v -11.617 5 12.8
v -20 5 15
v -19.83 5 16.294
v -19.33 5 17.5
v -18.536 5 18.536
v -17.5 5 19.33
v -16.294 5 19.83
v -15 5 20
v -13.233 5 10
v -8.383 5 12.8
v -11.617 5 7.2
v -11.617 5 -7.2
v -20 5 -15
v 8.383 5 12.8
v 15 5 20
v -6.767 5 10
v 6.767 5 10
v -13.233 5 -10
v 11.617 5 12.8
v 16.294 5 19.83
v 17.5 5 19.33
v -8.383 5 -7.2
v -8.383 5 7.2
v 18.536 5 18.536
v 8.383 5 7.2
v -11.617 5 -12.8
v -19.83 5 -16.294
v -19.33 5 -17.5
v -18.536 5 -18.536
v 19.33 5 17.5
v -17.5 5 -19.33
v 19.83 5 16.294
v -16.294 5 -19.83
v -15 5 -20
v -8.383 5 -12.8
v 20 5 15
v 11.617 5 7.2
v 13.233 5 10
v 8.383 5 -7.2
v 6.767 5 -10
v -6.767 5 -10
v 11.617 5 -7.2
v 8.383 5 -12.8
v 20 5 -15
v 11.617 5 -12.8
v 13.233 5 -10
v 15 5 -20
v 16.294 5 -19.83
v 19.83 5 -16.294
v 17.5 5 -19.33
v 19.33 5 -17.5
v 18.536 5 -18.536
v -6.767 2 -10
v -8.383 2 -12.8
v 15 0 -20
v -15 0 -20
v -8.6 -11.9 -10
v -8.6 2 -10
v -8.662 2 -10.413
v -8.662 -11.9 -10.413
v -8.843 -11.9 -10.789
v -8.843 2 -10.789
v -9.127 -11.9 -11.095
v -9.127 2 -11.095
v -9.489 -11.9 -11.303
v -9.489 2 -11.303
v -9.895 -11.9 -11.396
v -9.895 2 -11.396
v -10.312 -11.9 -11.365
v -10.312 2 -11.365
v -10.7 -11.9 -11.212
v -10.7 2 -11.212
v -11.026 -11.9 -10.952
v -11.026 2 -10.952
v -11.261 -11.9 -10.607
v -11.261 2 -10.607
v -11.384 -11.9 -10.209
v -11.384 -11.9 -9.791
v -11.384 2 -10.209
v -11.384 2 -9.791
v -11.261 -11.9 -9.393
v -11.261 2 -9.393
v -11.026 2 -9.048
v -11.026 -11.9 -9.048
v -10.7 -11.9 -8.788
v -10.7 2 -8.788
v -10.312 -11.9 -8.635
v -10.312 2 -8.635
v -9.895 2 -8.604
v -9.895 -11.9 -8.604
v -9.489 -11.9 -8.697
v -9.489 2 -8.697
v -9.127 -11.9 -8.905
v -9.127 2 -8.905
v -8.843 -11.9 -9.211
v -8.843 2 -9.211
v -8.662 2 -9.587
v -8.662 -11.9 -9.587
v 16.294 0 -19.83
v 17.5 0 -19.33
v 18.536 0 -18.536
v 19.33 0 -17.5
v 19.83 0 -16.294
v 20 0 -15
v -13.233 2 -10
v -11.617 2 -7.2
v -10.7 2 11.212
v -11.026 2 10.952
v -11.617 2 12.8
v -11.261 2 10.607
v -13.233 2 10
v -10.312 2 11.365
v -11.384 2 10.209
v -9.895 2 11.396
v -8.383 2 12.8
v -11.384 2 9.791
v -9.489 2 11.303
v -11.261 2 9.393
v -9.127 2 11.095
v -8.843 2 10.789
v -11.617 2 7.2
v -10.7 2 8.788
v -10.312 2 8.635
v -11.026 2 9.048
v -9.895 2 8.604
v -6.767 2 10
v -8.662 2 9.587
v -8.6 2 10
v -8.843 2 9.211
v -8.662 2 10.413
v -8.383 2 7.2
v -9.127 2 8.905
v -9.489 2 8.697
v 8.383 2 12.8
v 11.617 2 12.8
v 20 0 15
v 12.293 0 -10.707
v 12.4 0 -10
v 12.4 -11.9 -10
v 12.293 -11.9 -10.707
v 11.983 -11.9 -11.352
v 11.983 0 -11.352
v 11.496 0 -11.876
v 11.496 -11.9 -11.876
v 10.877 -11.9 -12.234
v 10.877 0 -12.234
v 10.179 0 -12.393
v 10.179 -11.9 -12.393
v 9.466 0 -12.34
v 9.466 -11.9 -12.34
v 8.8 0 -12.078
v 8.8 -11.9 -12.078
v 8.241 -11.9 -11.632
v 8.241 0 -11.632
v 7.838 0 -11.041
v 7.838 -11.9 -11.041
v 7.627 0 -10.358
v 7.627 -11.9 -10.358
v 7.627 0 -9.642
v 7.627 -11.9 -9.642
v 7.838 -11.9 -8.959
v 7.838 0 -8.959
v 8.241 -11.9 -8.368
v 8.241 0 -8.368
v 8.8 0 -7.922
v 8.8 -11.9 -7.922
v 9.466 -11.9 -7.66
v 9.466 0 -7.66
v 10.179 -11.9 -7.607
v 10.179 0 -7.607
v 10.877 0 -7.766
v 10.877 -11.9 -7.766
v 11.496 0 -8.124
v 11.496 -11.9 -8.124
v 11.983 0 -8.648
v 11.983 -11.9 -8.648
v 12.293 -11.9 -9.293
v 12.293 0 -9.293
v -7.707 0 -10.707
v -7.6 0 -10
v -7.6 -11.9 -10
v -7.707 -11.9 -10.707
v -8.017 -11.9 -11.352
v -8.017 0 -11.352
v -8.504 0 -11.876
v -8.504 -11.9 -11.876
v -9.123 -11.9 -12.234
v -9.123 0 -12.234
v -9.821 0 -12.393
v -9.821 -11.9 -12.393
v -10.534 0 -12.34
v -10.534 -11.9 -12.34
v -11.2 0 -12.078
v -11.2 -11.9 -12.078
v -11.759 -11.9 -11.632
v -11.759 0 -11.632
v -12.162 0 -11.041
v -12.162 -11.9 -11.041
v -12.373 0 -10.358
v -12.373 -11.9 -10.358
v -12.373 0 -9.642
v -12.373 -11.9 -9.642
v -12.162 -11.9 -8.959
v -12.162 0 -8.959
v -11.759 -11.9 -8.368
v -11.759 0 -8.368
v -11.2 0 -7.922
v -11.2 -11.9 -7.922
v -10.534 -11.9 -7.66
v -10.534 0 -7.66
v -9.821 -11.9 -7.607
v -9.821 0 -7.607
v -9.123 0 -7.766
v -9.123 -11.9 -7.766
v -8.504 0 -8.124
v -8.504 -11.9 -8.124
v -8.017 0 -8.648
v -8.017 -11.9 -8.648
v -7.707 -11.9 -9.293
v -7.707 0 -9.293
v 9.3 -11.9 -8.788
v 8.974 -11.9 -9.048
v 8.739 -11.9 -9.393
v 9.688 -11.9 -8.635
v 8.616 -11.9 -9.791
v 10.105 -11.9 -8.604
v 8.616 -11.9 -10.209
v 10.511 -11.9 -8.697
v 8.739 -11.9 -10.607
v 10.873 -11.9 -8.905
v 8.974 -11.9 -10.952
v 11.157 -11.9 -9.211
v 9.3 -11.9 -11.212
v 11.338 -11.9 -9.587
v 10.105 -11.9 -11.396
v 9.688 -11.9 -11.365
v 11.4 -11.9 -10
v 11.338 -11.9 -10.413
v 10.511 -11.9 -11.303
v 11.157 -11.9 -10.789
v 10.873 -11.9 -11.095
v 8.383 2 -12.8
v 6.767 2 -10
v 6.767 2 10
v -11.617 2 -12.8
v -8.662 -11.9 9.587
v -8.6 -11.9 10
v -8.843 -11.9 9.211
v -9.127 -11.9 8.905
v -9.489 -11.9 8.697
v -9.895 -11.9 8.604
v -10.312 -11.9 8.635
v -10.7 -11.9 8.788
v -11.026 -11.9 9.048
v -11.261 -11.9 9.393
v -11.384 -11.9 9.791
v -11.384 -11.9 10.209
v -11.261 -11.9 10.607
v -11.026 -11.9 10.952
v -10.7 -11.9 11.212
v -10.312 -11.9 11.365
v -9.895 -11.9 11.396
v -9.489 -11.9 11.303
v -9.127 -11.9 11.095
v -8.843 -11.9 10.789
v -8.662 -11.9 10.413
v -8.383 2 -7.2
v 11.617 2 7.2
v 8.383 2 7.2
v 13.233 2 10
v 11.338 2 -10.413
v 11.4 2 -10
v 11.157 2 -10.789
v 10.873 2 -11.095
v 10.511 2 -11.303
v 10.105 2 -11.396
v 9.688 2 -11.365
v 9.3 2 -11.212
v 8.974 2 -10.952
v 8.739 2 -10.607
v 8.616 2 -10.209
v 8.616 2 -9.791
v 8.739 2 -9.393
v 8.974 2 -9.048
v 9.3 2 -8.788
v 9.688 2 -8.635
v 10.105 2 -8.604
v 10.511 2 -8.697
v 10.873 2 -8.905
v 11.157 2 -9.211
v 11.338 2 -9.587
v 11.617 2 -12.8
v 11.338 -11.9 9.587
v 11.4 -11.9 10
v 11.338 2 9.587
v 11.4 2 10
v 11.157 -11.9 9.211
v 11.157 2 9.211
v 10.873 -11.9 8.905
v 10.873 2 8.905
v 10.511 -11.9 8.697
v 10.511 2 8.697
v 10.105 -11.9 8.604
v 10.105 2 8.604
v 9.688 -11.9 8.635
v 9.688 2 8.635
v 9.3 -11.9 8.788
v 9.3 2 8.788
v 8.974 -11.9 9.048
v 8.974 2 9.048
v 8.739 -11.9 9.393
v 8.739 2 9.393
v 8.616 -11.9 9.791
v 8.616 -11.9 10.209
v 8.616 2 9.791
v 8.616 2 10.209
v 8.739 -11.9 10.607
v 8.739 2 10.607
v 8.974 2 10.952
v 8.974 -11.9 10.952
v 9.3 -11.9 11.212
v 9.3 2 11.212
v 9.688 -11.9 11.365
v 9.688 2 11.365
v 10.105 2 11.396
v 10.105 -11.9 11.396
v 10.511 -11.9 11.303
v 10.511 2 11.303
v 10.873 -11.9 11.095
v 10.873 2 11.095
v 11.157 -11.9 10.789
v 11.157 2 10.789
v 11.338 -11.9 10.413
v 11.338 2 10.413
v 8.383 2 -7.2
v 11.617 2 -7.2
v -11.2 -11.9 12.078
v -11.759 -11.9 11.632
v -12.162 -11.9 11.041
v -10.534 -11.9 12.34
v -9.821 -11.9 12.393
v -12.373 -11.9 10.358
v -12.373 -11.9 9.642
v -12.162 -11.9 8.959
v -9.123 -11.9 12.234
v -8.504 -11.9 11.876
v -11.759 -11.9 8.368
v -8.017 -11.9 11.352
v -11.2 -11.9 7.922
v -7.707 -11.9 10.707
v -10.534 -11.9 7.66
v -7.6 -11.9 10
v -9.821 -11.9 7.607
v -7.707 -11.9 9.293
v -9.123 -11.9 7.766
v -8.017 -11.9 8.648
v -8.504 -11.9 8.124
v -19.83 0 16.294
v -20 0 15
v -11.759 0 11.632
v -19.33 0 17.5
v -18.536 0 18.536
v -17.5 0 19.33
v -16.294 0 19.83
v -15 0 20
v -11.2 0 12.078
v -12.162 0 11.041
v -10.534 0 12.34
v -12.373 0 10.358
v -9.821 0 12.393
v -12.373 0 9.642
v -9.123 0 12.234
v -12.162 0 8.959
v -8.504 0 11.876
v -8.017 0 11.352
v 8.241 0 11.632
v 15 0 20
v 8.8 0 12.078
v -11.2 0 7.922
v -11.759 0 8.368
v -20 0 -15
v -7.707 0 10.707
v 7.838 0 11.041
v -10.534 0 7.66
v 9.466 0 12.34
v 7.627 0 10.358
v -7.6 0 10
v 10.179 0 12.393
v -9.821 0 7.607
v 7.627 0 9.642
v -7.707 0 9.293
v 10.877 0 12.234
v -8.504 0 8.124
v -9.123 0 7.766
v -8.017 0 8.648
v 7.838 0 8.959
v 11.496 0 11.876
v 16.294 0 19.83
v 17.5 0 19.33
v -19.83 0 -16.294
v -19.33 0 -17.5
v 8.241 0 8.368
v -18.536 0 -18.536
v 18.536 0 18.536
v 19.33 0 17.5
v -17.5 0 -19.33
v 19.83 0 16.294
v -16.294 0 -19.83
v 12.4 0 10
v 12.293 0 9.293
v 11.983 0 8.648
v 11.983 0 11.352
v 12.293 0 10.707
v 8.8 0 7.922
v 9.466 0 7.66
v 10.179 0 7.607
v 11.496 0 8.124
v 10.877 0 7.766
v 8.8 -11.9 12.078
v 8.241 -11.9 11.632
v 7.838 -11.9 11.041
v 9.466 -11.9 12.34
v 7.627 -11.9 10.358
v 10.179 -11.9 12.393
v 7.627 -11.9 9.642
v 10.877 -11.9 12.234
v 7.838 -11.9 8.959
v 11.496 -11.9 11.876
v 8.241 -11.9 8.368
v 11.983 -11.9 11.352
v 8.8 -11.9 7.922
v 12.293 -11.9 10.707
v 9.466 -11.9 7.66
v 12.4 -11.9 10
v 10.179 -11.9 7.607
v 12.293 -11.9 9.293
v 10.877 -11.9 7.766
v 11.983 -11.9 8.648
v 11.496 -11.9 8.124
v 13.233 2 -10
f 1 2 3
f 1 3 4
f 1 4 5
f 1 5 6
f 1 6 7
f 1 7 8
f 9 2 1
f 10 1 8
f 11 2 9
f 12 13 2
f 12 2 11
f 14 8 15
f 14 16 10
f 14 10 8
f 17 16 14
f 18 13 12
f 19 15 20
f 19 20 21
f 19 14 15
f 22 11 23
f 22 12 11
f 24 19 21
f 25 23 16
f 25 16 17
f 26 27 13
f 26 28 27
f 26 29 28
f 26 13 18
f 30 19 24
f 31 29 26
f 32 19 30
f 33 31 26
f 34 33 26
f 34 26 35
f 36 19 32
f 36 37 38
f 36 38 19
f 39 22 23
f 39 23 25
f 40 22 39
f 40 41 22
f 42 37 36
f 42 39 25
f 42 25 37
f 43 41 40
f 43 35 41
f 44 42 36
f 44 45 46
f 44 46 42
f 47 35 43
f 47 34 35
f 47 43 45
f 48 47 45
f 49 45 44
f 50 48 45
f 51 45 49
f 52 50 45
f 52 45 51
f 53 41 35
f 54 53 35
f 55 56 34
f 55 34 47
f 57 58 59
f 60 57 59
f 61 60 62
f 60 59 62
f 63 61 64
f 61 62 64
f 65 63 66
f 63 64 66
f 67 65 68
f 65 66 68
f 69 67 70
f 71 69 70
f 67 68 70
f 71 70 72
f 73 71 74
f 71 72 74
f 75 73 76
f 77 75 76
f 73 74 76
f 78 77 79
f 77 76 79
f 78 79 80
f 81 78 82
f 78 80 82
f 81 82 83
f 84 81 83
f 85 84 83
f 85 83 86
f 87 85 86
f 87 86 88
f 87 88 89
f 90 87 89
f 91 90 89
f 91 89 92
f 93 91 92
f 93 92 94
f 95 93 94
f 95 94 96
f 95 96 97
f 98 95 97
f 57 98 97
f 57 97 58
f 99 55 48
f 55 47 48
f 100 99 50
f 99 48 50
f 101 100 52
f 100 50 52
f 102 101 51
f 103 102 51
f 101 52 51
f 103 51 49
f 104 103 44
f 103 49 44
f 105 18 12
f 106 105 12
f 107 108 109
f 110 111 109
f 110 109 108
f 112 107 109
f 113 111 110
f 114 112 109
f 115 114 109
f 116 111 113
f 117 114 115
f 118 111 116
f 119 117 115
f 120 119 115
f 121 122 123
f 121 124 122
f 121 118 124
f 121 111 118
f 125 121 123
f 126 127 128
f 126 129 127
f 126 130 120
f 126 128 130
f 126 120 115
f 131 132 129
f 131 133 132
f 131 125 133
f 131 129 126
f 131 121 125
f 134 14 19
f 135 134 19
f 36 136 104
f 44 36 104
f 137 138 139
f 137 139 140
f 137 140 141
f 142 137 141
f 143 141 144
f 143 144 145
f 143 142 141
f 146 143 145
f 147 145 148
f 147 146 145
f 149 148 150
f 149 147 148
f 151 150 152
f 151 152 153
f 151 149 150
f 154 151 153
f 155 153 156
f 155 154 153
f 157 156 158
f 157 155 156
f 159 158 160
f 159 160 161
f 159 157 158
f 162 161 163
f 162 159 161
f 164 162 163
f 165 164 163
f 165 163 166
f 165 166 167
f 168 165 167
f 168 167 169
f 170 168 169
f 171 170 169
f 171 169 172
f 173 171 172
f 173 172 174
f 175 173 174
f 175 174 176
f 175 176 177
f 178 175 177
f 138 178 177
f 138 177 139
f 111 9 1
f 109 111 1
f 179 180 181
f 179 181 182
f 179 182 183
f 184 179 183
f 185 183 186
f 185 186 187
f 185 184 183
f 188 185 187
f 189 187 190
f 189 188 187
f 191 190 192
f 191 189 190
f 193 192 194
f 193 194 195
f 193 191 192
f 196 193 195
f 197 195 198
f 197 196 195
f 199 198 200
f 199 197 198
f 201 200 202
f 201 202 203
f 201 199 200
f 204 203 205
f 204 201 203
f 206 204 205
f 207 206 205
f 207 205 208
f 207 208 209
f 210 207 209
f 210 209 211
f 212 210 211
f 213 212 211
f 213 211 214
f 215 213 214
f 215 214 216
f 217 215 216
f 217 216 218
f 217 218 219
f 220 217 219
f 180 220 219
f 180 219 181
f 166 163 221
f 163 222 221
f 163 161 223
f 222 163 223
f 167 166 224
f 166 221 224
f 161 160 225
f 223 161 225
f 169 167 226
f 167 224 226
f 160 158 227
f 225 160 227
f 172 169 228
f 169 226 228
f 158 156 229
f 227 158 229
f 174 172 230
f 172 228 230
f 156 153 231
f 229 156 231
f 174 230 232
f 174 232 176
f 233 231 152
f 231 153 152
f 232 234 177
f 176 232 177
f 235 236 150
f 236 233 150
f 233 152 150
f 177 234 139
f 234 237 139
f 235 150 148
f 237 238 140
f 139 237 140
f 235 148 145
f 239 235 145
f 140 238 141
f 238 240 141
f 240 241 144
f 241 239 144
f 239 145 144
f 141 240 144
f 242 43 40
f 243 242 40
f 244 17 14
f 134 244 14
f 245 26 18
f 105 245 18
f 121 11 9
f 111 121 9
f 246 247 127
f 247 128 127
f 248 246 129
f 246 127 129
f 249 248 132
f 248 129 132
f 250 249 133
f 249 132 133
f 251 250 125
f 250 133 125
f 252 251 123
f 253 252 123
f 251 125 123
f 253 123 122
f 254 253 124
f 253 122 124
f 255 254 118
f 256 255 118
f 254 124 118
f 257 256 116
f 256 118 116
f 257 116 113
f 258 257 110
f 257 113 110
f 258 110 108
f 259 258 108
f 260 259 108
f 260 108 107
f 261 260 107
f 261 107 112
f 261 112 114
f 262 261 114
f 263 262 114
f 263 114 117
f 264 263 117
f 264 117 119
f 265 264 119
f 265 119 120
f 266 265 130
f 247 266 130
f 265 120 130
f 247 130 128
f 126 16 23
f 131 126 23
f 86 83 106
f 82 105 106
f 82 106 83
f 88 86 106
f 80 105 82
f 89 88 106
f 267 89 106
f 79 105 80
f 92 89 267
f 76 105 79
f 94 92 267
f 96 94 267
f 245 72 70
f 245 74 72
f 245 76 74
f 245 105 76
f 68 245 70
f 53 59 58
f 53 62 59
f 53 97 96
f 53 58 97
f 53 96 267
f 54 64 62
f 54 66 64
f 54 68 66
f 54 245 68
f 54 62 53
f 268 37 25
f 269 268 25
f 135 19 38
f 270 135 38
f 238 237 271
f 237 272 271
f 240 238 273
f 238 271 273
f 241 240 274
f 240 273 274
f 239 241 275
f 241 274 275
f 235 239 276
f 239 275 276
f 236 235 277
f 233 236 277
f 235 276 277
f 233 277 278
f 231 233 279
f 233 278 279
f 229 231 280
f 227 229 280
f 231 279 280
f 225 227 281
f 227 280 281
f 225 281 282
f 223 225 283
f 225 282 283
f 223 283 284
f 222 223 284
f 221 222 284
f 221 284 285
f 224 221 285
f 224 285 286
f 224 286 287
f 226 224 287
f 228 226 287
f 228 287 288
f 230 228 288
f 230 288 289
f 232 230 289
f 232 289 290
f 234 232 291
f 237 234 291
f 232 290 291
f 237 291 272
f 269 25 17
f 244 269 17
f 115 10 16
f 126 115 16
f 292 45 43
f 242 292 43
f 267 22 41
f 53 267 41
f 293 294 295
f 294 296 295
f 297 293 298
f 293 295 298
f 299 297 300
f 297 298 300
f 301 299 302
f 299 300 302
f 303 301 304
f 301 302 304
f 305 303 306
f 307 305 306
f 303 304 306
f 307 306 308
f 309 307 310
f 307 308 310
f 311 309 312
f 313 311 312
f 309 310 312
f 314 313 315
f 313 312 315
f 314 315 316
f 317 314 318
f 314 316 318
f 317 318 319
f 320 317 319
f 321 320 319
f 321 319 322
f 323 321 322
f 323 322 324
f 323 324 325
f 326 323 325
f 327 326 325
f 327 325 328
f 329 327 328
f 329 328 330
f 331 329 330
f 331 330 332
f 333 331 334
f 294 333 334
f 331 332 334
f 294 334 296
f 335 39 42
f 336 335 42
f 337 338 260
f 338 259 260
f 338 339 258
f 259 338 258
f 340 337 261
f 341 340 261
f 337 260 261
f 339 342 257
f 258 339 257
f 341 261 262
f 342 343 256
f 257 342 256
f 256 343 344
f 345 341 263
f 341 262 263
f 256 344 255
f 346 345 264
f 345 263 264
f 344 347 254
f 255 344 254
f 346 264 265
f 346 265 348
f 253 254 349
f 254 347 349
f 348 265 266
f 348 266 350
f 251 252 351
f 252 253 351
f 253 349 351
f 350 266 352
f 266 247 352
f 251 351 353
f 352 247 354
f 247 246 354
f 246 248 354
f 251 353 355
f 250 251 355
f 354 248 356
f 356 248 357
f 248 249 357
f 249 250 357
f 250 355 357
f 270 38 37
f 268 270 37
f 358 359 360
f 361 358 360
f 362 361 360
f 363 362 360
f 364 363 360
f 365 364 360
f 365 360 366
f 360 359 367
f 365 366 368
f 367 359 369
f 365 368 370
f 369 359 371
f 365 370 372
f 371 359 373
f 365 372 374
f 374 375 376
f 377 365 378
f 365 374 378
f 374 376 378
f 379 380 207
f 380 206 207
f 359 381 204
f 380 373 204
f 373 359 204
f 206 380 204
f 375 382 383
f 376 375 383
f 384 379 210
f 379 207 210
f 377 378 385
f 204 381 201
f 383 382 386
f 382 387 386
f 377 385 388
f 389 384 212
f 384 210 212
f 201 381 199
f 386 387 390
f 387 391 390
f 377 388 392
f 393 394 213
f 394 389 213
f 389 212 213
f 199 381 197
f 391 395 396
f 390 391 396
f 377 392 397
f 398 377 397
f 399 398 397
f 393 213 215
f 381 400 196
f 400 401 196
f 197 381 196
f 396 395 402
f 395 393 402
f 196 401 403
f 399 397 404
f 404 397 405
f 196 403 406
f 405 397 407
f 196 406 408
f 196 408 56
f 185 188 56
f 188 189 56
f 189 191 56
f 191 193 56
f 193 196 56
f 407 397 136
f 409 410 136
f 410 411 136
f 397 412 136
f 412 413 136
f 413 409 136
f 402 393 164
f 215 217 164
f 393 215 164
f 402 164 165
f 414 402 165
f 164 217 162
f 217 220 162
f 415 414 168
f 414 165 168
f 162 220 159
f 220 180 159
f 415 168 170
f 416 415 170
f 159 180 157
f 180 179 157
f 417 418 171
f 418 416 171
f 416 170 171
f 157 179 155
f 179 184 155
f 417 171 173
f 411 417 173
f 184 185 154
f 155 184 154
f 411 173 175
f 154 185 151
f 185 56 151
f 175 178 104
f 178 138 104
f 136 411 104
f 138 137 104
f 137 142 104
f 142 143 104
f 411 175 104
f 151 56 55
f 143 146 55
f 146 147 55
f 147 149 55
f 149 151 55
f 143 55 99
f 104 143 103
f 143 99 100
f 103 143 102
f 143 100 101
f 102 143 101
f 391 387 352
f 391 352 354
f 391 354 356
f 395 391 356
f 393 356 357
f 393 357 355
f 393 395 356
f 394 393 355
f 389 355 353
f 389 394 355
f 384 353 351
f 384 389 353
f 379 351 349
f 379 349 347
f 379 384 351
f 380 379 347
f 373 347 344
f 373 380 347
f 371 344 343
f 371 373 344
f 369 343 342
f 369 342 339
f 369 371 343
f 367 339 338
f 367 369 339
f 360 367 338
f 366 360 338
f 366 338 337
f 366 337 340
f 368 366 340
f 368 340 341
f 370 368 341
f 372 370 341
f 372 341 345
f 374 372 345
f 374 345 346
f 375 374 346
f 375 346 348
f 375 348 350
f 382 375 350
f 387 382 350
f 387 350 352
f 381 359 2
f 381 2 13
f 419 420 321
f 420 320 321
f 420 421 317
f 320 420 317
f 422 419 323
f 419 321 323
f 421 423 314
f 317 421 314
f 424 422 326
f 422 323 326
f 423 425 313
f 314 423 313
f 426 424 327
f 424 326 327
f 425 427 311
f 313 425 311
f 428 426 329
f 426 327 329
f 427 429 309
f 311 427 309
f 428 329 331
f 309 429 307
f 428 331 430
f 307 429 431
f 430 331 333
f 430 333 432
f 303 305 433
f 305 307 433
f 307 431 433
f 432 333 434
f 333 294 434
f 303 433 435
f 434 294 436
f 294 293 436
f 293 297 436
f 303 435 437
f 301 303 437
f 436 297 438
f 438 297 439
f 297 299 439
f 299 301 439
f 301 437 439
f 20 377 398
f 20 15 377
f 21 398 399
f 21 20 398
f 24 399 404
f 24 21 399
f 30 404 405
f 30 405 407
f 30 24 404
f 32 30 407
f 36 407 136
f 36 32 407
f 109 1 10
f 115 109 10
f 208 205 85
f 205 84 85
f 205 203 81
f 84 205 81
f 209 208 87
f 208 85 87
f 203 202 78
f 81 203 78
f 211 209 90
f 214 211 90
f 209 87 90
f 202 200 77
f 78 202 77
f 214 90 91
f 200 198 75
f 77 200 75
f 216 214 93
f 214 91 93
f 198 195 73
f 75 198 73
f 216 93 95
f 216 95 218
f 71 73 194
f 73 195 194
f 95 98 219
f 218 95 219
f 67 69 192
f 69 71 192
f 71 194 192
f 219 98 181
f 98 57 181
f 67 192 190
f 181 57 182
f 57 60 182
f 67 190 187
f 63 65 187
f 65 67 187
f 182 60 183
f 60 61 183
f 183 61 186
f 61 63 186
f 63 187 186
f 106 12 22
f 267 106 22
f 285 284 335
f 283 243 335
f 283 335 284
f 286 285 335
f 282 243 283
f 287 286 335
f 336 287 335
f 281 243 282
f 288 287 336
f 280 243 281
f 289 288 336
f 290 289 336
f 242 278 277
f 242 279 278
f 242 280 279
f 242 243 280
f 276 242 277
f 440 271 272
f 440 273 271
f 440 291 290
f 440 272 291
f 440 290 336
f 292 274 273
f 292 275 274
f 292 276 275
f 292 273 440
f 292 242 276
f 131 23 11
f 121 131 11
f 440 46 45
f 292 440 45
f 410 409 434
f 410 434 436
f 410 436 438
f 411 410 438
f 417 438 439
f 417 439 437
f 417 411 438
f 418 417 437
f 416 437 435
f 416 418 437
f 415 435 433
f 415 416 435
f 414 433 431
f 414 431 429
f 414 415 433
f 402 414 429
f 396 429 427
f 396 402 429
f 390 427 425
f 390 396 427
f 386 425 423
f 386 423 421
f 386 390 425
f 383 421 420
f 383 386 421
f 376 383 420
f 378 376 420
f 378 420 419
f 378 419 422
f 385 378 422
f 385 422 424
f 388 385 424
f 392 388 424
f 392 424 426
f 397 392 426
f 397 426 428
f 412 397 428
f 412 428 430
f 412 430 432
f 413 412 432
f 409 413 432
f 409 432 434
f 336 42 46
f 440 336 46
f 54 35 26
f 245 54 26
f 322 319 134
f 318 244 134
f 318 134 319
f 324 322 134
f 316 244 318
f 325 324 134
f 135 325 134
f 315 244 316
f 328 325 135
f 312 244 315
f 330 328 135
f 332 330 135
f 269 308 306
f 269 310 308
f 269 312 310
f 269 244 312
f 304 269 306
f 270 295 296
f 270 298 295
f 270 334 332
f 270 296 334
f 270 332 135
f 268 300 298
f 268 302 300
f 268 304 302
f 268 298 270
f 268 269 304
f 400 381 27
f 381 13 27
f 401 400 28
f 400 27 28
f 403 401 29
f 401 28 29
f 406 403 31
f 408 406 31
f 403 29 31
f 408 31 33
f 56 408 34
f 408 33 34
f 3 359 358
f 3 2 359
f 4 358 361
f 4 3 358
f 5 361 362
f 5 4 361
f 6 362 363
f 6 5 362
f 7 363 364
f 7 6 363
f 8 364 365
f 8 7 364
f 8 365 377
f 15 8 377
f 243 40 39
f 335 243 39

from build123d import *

# Parameters (mm, degrees)
SKETCH1_W           = 40
SKETCH1_H           = 40
BOSS_EXTRUDE1_DEPTH = 5
CUT_EXTRUDE1_DEPTH  = 3
SKETCH3_R           = 1.4
CUT_EXTRUDE2_DEPTH  = 29.442925307
FILLET1_R           = 5
SKETCH3_3_R         = 2.4
SKETCH3_3_R_2       = 1.4
BOSS_EXTRUDE2_DEPTH = 13.9


with BuildPart() as part:
    # Sketch1 → Boss-Extrude1 (new body)
    with BuildSketch(Plane(origin=(0, 0, 0), x_dir=(1, 0, 0), z_dir=(0, 1, 0))):
        Rectangle(SKETCH1_W, SKETCH1_H)
    extrude(amount=BOSS_EXTRUDE1_DEPTH)

    # Sketch2 → Cut-Extrude1 (cut)
    with BuildSketch(Plane(origin=(0, 5, 0), x_dir=(1, 0, 0), z_dir=(0, 1, 0))):
        Polygon((-8.383419246, -7.2), (-11.616580754, -7.2), (-13.233161507, -10), (-11.616580754, -12.8), (-8.383419246, -12.8), (-6.766838493, -10), align=None)
        Polygon((8.383419246, -7.2), (6.766838493, -10), (8.383419246, -12.8), (11.616580754, -12.8), (13.233161507, -10), (11.616580754, -7.2), align=None)
        Polygon((-11.616580754, 7.2), (-8.383419246, 7.2), (-6.766838493, 10), (-8.383419246, 12.8), (-11.616580754, 12.8), (-13.233161507, 10), align=None)
        Polygon((8.383419246, 7.2), (11.616580754, 7.2), (13.233161507, 10), (11.616580754, 12.8), (8.383419246, 12.8), (6.766838493, 10), align=None)
    extrude(amount=-CUT_EXTRUDE1_DEPTH, mode=Mode.SUBTRACT)

    # Sketch3 → Cut-Extrude2 (cut, through all)
    with BuildSketch(Plane(origin=(0, 2, 0), x_dir=(1, 0, 0), z_dir=(0, 1, 0))):
        with Locations((-10, 10)):
            Circle(SKETCH3_R)
        with Locations((10, 10)):
            Circle(SKETCH3_R)
        with Locations((-10, -10)):
            Circle(SKETCH3_R)
        with Locations((10, -10)):
            Circle(SKETCH3_R)
    extrude(amount=-CUT_EXTRUDE2_DEPTH, mode=Mode.SUBTRACT)

    # Fillet1
    fillet1_edges = [part.edges().sort_by_distance(p)[0] for p in [
        (-20, 2.5, 20),
        (20, 2.5, 20),
        (20, 2.5, -20),
        (-20, 2.5, -20),
    ]]
    fillet(fillet1_edges, radius=FILLET1_R)

    # Sketch3<3> → Boss-Extrude2 (add)
    # profile 1 of 4: a face of its own
    with BuildSketch(Plane(origin=(0, 2, 0), x_dir=(1, 0, 0), z_dir=(0, 1, 0))):
        with Locations((-10, 10)):
            Circle(SKETCH3_3_R)
        with Locations((-10, 10)):
            Circle(SKETCH3_3_R_2, mode=Mode.SUBTRACT)
    # profile 2 of 4: a face of its own
    with BuildSketch(Plane(origin=(0, 2, 0), x_dir=(1, 0, 0), z_dir=(0, 1, 0))):
        with Locations((-10, -10)):
            Circle(SKETCH3_3_R)
        with Locations((-10, -10)):
            Circle(SKETCH3_3_R_2, mode=Mode.SUBTRACT)
    # profile 3 of 4: a face of its own
    with BuildSketch(Plane(origin=(0, 2, 0), x_dir=(1, 0, 0), z_dir=(0, 1, 0))):
        with Locations((10, -10)):
            Circle(SKETCH3_3_R)
        with Locations((10, -10)):
            Circle(SKETCH3_3_R_2, mode=Mode.SUBTRACT)
    # profile 4 of 4: a face of its own
    with BuildSketch(Plane(origin=(0, 2, 0), x_dir=(1, 0, 0), z_dir=(0, 1, 0))):
        with Locations((10, 10)):
            Circle(SKETCH3_3_R)
        with Locations((10, 10)):
            Circle(SKETCH3_3_R_2, mode=Mode.SUBTRACT)
    extrude(amount=-BOSS_EXTRUDE2_DEPTH)


solid = part.part
